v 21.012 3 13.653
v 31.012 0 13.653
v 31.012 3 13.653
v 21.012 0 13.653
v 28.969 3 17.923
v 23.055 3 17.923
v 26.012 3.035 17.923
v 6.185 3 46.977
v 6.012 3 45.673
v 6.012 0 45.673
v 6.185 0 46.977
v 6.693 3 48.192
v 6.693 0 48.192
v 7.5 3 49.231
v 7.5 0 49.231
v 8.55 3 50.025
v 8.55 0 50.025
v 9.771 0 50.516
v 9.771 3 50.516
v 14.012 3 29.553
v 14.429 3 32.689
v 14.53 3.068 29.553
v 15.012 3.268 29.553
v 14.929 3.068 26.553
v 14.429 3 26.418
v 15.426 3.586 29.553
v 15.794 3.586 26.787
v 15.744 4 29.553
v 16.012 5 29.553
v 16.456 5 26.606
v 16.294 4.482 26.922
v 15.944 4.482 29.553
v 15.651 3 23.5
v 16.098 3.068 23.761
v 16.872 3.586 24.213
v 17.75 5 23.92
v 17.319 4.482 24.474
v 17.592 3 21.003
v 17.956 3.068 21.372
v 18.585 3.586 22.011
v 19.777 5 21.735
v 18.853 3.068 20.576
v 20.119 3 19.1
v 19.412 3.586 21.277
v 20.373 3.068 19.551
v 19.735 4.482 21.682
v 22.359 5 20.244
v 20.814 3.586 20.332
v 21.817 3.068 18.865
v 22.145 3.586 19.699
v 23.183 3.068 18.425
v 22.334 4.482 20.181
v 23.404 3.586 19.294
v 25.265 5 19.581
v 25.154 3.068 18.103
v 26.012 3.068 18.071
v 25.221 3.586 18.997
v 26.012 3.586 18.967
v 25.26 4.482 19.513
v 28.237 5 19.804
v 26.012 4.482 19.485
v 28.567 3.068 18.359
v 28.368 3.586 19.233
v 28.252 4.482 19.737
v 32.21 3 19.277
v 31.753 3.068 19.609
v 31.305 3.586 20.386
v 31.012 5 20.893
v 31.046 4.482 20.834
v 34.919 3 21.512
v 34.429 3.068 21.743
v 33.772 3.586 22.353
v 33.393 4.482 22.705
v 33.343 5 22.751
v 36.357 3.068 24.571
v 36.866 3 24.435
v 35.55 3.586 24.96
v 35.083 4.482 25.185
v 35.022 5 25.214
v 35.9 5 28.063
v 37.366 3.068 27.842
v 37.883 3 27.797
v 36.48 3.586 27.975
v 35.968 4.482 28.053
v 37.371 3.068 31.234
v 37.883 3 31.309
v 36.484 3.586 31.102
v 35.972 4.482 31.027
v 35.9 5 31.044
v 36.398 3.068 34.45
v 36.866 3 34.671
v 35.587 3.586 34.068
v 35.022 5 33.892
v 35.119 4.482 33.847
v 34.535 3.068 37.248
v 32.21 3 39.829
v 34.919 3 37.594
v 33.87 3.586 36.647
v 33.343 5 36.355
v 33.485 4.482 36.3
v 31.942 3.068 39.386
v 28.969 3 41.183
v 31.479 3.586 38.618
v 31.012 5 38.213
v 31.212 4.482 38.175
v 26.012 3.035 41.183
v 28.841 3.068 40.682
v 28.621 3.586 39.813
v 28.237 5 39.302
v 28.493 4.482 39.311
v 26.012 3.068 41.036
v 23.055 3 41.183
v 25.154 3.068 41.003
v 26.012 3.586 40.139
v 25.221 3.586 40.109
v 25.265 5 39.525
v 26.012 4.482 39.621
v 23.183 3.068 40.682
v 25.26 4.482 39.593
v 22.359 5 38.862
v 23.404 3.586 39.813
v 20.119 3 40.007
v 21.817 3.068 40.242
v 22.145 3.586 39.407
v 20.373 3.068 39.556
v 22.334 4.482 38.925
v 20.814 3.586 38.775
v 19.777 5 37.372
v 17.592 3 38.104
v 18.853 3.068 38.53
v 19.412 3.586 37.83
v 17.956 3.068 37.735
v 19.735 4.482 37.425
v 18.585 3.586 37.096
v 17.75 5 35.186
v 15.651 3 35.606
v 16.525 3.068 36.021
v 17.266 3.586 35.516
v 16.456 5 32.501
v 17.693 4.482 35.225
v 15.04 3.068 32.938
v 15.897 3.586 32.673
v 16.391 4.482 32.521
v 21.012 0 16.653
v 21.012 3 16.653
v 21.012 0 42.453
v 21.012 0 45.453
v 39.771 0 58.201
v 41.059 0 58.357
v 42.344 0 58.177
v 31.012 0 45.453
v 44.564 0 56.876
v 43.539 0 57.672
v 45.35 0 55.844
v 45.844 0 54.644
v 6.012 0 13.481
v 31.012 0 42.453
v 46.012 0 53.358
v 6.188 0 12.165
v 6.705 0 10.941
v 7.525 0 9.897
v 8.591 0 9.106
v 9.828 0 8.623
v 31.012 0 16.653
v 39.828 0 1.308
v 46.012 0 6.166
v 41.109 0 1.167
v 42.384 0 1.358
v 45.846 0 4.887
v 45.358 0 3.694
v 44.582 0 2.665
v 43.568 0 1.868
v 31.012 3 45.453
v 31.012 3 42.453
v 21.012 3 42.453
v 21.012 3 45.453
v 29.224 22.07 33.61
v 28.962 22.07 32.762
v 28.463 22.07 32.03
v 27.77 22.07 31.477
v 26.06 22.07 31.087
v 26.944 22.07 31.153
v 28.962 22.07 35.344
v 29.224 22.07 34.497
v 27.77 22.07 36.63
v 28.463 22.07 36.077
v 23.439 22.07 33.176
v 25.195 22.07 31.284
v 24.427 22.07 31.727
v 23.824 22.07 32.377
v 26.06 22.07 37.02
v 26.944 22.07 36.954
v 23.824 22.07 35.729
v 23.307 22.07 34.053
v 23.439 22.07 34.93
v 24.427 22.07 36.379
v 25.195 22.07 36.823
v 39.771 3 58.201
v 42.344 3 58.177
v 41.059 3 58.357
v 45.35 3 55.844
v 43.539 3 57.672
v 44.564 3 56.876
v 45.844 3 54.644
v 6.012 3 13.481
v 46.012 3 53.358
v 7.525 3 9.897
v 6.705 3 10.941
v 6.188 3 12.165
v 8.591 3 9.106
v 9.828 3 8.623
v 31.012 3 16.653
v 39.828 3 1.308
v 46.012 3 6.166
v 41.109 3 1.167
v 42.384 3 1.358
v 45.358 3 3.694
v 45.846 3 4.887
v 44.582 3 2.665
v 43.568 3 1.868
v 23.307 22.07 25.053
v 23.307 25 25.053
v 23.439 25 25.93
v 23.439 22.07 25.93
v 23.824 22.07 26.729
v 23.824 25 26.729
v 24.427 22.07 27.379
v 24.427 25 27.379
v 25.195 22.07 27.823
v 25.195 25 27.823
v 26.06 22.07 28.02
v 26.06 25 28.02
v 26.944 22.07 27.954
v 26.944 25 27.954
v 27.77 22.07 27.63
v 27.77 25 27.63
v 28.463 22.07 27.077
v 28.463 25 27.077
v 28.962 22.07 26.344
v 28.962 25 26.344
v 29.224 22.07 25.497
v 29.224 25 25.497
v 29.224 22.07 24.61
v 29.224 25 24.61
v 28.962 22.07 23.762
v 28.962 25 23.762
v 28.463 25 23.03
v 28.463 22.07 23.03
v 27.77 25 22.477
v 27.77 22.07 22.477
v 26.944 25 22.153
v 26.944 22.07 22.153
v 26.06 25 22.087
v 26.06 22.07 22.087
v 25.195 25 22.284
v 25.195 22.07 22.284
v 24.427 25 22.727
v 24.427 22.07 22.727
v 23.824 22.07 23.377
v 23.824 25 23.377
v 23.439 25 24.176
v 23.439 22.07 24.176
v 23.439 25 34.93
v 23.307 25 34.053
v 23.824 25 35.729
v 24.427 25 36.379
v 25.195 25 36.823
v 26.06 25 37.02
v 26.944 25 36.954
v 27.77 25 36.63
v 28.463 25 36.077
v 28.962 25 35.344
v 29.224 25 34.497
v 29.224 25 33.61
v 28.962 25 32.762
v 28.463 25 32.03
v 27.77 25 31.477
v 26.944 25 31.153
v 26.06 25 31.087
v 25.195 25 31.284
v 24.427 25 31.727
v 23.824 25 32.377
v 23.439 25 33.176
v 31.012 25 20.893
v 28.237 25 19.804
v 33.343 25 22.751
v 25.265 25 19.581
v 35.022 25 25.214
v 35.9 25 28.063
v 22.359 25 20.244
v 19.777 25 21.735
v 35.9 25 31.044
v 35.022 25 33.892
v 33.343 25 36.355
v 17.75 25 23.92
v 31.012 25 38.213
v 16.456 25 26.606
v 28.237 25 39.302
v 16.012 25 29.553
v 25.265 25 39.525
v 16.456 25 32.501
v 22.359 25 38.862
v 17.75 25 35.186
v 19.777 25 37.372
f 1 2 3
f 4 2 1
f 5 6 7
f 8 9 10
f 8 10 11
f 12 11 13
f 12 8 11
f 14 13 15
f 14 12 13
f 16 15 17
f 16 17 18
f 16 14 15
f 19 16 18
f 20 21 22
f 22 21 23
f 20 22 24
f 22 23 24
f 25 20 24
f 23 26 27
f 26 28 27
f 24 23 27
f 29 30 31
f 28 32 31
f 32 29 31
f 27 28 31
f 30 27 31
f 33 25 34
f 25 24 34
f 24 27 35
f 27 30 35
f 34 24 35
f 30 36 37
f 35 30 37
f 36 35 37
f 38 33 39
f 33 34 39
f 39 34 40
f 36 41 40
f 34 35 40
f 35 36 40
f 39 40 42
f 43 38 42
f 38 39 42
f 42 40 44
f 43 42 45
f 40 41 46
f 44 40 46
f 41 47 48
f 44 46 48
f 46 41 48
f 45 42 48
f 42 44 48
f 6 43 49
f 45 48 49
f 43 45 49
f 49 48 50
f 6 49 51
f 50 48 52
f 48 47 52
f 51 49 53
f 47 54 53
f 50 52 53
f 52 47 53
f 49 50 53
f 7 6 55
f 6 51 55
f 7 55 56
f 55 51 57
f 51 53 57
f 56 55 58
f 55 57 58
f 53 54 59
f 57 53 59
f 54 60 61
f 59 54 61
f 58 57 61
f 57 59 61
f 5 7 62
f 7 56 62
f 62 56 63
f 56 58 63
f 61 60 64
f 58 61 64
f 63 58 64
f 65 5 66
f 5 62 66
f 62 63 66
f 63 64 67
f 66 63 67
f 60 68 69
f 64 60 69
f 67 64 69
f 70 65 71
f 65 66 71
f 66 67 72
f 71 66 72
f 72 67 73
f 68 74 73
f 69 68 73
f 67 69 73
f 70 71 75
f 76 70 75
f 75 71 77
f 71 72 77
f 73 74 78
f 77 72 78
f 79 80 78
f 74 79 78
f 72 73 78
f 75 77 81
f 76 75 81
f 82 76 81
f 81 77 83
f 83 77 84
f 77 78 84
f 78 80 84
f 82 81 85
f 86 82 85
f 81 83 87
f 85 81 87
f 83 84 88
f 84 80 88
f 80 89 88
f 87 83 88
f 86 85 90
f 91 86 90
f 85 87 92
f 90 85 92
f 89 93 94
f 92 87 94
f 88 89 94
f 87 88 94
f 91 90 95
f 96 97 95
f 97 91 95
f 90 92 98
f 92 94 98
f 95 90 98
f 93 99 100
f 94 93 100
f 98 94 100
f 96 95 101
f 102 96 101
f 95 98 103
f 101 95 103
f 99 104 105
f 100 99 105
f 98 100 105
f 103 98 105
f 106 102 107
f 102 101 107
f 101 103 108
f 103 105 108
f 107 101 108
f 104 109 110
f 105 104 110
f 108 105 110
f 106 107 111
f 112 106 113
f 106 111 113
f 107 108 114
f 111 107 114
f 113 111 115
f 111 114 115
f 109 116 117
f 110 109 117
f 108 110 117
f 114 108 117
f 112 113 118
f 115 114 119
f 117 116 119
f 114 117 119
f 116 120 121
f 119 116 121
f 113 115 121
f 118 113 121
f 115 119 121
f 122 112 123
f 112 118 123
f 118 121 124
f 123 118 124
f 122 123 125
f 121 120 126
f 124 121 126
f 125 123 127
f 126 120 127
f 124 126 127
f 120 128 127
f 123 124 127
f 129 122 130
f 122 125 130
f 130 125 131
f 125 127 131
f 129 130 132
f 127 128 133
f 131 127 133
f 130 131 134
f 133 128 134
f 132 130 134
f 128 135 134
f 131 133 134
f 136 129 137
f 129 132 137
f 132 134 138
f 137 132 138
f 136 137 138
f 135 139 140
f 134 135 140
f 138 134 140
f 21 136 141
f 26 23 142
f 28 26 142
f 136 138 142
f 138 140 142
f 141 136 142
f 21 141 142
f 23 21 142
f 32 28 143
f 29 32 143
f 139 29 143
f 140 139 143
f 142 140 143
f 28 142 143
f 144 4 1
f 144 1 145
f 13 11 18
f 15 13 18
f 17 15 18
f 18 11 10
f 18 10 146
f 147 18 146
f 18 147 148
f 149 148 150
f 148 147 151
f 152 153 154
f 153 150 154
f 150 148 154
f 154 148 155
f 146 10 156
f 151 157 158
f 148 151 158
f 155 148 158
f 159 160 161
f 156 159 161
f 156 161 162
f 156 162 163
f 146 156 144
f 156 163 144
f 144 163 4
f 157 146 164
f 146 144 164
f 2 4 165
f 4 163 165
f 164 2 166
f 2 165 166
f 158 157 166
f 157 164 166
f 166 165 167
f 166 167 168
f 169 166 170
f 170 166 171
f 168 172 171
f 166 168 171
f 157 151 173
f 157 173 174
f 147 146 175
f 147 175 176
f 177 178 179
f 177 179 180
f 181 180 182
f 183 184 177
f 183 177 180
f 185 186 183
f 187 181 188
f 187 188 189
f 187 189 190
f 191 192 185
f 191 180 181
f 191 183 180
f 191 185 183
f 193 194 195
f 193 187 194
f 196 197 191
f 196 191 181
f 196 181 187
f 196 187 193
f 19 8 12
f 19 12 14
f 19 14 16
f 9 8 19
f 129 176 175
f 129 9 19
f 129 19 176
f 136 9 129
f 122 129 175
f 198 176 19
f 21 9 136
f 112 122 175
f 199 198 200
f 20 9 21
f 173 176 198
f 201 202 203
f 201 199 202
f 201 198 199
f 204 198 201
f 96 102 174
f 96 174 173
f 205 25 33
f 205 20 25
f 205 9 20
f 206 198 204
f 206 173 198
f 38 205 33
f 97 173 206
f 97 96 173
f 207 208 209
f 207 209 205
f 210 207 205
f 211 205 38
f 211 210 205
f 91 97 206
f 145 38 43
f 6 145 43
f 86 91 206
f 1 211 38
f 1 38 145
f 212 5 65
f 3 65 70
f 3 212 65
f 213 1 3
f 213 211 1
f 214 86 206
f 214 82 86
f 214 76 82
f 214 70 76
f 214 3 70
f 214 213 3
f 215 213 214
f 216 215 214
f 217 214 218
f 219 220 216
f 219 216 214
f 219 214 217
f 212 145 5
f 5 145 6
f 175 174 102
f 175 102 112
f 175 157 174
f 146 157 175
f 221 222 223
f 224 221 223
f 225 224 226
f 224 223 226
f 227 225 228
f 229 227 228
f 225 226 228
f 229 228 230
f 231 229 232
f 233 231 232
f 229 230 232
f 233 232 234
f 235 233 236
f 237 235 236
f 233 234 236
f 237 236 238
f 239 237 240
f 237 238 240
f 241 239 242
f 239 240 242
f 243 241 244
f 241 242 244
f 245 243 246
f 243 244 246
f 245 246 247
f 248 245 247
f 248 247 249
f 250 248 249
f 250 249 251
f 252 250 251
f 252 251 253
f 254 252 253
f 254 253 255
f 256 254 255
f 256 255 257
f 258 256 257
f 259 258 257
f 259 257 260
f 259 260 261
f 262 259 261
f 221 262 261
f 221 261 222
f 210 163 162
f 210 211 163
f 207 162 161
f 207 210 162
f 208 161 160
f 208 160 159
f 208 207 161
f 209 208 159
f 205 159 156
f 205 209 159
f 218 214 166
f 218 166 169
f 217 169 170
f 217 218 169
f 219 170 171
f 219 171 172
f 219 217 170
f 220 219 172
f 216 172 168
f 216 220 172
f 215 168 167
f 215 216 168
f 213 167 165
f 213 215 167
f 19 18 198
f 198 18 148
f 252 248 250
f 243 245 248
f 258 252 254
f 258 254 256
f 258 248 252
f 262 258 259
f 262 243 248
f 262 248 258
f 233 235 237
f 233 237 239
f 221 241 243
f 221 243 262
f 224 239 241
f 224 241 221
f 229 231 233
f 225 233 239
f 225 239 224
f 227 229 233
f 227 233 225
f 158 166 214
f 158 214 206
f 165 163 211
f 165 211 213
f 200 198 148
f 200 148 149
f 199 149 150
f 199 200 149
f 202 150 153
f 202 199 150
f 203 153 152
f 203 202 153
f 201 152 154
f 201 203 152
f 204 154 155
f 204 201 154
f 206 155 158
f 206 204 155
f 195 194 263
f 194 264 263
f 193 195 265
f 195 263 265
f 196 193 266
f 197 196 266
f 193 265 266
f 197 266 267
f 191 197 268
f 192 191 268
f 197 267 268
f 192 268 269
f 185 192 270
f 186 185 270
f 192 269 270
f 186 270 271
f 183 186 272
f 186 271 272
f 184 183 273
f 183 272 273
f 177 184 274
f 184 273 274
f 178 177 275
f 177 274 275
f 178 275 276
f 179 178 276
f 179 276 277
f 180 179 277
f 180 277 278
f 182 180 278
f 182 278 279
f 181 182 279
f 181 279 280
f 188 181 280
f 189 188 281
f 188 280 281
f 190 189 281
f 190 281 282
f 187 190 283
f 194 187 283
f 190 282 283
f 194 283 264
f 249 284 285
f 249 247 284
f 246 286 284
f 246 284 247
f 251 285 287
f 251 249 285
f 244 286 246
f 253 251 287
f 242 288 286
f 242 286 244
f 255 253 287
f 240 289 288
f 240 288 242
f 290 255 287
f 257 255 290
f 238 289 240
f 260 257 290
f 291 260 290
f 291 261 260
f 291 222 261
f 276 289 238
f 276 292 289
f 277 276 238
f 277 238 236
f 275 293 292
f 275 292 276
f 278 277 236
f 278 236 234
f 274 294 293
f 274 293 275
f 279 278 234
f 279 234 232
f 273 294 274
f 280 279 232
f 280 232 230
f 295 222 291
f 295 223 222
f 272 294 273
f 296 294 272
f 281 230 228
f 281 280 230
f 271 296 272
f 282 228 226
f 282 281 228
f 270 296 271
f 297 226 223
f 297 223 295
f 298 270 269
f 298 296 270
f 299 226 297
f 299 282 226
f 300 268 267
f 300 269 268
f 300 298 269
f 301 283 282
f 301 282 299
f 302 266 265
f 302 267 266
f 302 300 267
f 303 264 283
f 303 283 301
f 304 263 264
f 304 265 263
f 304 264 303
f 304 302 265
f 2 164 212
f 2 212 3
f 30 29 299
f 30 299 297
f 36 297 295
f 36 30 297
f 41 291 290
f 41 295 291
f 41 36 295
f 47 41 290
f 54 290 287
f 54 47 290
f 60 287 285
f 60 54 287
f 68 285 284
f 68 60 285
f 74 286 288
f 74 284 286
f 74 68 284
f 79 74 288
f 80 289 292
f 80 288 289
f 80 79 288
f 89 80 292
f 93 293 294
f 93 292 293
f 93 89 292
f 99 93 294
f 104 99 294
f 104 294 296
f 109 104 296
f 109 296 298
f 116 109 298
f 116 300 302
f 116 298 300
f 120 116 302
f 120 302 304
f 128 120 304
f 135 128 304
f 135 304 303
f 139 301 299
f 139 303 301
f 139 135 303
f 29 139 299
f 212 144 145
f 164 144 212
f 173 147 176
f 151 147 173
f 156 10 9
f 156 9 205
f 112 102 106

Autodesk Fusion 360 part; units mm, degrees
sketch "Sketch1" plane through (0, 0, 0) normal (0, 1, 0) x (1, 0, 0)
  line L0 (46.0121, 0.2) -> (46.0121, -59.8)
  line L1 (6.0121, -29.5532) -> (6.0121, -9.5532)
  line L2 (6.0121, -29.5532) -> (6.0121, -49.5532)
  line L3 (6.0121, -9.5532) -> (46.0121, 0.2)
  line L4 (6.0121, -49.5532) -> (46.0121, -59.8)
  line L5 (31.0121, -13.6532) -> (21.0121, -13.6532)
  line L6 (21.0121, -13.6532) -> (21.0121, -16.6532)
  line L7 (21.0121, -16.6532) -> (31.0121, -16.6532)
  line L8 (31.0121, -16.6532) -> (31.0121, -13.6532)
  line L9 (31.0121, -42.4532) -> (21.0121, -42.4532)
  line L10 (21.0121, -42.4532) -> (21.0121, -45.4532)
  line L11 (21.0121, -45.4532) -> (31.0121, -45.4532)
  line L12 (31.0121, -45.4532) -> (31.0121, -42.4532)
  point P0 (26.0121, -15.0532)
  point P1 (25.8317, -44.4989)
  dimension "d1" = 60
  dimension "d6" = 20
  dimension "d7" = 20
  dimension "d9" = 40
  dimension "d10" = 40
  dimension "d11" = 20
  dimension "d12" = 14.5
  dimension "d13" = 10
  dimension "d14" = 3
  dimension "d15" = 10
  dimension "d16" = 3
  dimension "d19" = 12.9
  dimension "d20" = 12.9
  dimension "d21" = 25.8
  dimension "d22" = 15
  dimension "d23" = 15
extrude "Extrude1" add sketch "Sketch1" along normal blind 3
sketch "Sketch2" plane through (0, 3, 0) normal (0, 1, 0) x (-1, 0, 0)
  line L0 (-31.0121, 42.4532) -> (-31.0121, 45.4532)
  line L1 (-31.0121, 45.4532) -> (-21.0121, 45.4532)
  line L2 (-21.0121, 45.4532) -> (-21.0121, 42.4532)
  line L3 (-21.0121, 42.4532) -> (-31.0121, 42.4532)
  line L4 (-31.0121, 13.6532) -> (-31.0121, 16.6532)
  line L5 (-31.0121, 16.6532) -> (-21.0121, 16.6532)
  line L6 (-21.0121, 16.6532) -> (-21.0121, 13.6532)
  line L7 (-21.0121, 13.6532) -> (-31.0121, 13.6532)
  line L8 (-6.0121, 9.5532) -> (-6.0121, 49.5532)
  line L9 (-6.0121, 49.5532) -> (-46.0121, 59.8)
  line L10 (-46.0121, 59.8) -> (-46.0121, -0.2)
  line L11 (-46.0121, -0.2) -> (-6.0121, 9.5532)
  circle A0 centre (-26.0121, 29.5532) radius 10
  point P0 (-26.0121, 29.5532)
  dimension "d38" = 12.9
  dimension "d39" = 12.9
  dimension "d42" = 20
extrude "Extrude2" add sketch "Sketch2" along normal blind 22 contours A0
sketch "Sketch3" plane through (0, 25, 0) normal (0, 1, 0) x (-1, 0, 0)
  line L0 (-28.0121, 38.7532) -> (-24.0121, 38.7532)
  line L1 (-24.0121, 38.7532) -> (-24.0121, 20.7532)
  line L2 (-24.0121, 20.7532) -> (-28.0121, 20.7532)
  line L3 (-28.0121, 20.7532) -> (-28.0121, 38.7532)
  line L4 (-28.0121, 38.7532) -> (-24.0121, 20.7532) construction
  line L5 (-24.0121, 38.7532) -> (-28.0121, 20.7532) construction
  circle A0 centre (-26.0121, 29.5532) radius 10
  point P0 (-26.0121, 29.7532)
  dimension "d28" = 18
fillet "Fillet4" radius 2 1 edges at (35.3354, 3, 33.1694)
fillet "Fillet3" radius 5 4 edges at (6.0121, 1.5, 9.5532) (6.0121, 1.5, 49.5532) (46.0121, 1.5, 59.8) (46.0121, 1.5, -0.2)
sketch "Sketch5" plane through (0, 25, 0) normal (0, 1, 0) x (-1, 0, 0)
  circle A0 centre (-26.0121, 29.5532) radius 10
  circle A1 centre (-26.282, 34.0532) radius 2.975
  circle A2 centre (-26.282, 25.0532) radius 2.975
  dimension "d48" = 5.95
  dimension "d49" = 5.95
  dimension "d50" = 4.5
  dimension "d51" = 4.5
extrude "Extrude5" cut sketch "Sketch5" against normal blind 2.93 contours A1 | A2
sketch "Sketch6" plane through (0, 3, 0) normal (0, 1, 0) x (-1, 0, 0)
  arc A0 (-46.0121, 6.1656) -> (-39.8276, 1.308) centre (-41.0121, 6.1656) ccw
  line L0 (-39.8276, 1.308) -> (-9.8276, 8.6229)
  arc A1 (-9.8276, 8.6229) -> (-6.0121, 13.4806) centre (-11.0121, 13.4806) ccw
  line L1 (-6.0121, 13.4806) -> (-6.0121, 45.6726)
  arc A2 (-6.0121, 45.6726) -> (-9.7713, 50.5162) centre (-11.0121, 45.6726) ccw
  line L2 (-9.7713, 50.5162) -> (-39.7713, 58.2013)
  arc A3 (-39.7713, 58.2013) -> (-46.0121, 53.3577) centre (-41.0121, 53.3577) ccw
  line L3 (-46.0121, 53.3577) -> (-46.0121, 6.1656)
  line L4 (-31.0121, 42.4532) -> (-31.0121, 45.4532)
  line L5 (-31.0121, 45.4532) -> (-21.0121, 45.4532)
  line L6 (-21.0121, 45.4532) -> (-21.0121, 42.4532)
  line L7 (-21.0121, 42.4532) -> (-31.0121, 42.4532)
  line L8 (-31.0121, 13.6532) -> (-31.0121, 16.6532)
  line L9 (-31.0121, 16.6532) -> (-21.0121, 16.6532)
  line L10 (-21.0121, 16.6532) -> (-21.0121, 13.6532)
  line L11 (-21.0121, 13.6532) -> (-31.0121, 13.6532)
  circle A4 centre (-26.0121, 29.5532) radius 12
  line L12 (-21.0121, 17.9232) -> (-31.0121, 17.9232)
  line L13 (-31.0121, 17.9232) -> (-31.0121, 12.3832)
  line L14 (-31.0121, 12.3832) -> (-21.0121, 12.3832)
  line L15 (-21.0121, 12.3832) -> (-21.0121, 17.9232)
  line L16 (-21.0121, 17.9232) -> (-31.0121, 12.3832) construction
  line L17 (-31.0121, 17.9232) -> (-21.0121, 12.3832) construction
  line L18 (-31.0121, 41.1832) -> (-21.0121, 41.1832)
  line L19 (-21.0121, 41.1832) -> (-21.0121, 46.7232)
  line L20 (-21.0121, 46.7232) -> (-31.0121, 46.7232)
  line L21 (-31.0121, 46.7232) -> (-31.0121, 41.1832)
  line L22 (-31.0121, 41.1832) -> (-21.0121, 46.7232) construction
  line L23 (-21.0121, 41.1832) -> (-31.0121, 46.7232) construction
  point P0 (-26.0121, 15.1532)
  point P1 (-26.0121, 43.9532)
  dimension "d52" = 10
  dimension "d53" = 5.54
  dimension "d54" = 5.54
extrude "Extrude6" cut sketch "Sketch6" along normal blind 11 contours L7 A4 L18 L19 L21 | A4 L18 | A4 L12 | L9 A4 L12 L13 L15
equation "d12 = ( 29 / 2 ) * 1 mm"
equation "d26 = 37 mm - 10 mm - 5 mm"
